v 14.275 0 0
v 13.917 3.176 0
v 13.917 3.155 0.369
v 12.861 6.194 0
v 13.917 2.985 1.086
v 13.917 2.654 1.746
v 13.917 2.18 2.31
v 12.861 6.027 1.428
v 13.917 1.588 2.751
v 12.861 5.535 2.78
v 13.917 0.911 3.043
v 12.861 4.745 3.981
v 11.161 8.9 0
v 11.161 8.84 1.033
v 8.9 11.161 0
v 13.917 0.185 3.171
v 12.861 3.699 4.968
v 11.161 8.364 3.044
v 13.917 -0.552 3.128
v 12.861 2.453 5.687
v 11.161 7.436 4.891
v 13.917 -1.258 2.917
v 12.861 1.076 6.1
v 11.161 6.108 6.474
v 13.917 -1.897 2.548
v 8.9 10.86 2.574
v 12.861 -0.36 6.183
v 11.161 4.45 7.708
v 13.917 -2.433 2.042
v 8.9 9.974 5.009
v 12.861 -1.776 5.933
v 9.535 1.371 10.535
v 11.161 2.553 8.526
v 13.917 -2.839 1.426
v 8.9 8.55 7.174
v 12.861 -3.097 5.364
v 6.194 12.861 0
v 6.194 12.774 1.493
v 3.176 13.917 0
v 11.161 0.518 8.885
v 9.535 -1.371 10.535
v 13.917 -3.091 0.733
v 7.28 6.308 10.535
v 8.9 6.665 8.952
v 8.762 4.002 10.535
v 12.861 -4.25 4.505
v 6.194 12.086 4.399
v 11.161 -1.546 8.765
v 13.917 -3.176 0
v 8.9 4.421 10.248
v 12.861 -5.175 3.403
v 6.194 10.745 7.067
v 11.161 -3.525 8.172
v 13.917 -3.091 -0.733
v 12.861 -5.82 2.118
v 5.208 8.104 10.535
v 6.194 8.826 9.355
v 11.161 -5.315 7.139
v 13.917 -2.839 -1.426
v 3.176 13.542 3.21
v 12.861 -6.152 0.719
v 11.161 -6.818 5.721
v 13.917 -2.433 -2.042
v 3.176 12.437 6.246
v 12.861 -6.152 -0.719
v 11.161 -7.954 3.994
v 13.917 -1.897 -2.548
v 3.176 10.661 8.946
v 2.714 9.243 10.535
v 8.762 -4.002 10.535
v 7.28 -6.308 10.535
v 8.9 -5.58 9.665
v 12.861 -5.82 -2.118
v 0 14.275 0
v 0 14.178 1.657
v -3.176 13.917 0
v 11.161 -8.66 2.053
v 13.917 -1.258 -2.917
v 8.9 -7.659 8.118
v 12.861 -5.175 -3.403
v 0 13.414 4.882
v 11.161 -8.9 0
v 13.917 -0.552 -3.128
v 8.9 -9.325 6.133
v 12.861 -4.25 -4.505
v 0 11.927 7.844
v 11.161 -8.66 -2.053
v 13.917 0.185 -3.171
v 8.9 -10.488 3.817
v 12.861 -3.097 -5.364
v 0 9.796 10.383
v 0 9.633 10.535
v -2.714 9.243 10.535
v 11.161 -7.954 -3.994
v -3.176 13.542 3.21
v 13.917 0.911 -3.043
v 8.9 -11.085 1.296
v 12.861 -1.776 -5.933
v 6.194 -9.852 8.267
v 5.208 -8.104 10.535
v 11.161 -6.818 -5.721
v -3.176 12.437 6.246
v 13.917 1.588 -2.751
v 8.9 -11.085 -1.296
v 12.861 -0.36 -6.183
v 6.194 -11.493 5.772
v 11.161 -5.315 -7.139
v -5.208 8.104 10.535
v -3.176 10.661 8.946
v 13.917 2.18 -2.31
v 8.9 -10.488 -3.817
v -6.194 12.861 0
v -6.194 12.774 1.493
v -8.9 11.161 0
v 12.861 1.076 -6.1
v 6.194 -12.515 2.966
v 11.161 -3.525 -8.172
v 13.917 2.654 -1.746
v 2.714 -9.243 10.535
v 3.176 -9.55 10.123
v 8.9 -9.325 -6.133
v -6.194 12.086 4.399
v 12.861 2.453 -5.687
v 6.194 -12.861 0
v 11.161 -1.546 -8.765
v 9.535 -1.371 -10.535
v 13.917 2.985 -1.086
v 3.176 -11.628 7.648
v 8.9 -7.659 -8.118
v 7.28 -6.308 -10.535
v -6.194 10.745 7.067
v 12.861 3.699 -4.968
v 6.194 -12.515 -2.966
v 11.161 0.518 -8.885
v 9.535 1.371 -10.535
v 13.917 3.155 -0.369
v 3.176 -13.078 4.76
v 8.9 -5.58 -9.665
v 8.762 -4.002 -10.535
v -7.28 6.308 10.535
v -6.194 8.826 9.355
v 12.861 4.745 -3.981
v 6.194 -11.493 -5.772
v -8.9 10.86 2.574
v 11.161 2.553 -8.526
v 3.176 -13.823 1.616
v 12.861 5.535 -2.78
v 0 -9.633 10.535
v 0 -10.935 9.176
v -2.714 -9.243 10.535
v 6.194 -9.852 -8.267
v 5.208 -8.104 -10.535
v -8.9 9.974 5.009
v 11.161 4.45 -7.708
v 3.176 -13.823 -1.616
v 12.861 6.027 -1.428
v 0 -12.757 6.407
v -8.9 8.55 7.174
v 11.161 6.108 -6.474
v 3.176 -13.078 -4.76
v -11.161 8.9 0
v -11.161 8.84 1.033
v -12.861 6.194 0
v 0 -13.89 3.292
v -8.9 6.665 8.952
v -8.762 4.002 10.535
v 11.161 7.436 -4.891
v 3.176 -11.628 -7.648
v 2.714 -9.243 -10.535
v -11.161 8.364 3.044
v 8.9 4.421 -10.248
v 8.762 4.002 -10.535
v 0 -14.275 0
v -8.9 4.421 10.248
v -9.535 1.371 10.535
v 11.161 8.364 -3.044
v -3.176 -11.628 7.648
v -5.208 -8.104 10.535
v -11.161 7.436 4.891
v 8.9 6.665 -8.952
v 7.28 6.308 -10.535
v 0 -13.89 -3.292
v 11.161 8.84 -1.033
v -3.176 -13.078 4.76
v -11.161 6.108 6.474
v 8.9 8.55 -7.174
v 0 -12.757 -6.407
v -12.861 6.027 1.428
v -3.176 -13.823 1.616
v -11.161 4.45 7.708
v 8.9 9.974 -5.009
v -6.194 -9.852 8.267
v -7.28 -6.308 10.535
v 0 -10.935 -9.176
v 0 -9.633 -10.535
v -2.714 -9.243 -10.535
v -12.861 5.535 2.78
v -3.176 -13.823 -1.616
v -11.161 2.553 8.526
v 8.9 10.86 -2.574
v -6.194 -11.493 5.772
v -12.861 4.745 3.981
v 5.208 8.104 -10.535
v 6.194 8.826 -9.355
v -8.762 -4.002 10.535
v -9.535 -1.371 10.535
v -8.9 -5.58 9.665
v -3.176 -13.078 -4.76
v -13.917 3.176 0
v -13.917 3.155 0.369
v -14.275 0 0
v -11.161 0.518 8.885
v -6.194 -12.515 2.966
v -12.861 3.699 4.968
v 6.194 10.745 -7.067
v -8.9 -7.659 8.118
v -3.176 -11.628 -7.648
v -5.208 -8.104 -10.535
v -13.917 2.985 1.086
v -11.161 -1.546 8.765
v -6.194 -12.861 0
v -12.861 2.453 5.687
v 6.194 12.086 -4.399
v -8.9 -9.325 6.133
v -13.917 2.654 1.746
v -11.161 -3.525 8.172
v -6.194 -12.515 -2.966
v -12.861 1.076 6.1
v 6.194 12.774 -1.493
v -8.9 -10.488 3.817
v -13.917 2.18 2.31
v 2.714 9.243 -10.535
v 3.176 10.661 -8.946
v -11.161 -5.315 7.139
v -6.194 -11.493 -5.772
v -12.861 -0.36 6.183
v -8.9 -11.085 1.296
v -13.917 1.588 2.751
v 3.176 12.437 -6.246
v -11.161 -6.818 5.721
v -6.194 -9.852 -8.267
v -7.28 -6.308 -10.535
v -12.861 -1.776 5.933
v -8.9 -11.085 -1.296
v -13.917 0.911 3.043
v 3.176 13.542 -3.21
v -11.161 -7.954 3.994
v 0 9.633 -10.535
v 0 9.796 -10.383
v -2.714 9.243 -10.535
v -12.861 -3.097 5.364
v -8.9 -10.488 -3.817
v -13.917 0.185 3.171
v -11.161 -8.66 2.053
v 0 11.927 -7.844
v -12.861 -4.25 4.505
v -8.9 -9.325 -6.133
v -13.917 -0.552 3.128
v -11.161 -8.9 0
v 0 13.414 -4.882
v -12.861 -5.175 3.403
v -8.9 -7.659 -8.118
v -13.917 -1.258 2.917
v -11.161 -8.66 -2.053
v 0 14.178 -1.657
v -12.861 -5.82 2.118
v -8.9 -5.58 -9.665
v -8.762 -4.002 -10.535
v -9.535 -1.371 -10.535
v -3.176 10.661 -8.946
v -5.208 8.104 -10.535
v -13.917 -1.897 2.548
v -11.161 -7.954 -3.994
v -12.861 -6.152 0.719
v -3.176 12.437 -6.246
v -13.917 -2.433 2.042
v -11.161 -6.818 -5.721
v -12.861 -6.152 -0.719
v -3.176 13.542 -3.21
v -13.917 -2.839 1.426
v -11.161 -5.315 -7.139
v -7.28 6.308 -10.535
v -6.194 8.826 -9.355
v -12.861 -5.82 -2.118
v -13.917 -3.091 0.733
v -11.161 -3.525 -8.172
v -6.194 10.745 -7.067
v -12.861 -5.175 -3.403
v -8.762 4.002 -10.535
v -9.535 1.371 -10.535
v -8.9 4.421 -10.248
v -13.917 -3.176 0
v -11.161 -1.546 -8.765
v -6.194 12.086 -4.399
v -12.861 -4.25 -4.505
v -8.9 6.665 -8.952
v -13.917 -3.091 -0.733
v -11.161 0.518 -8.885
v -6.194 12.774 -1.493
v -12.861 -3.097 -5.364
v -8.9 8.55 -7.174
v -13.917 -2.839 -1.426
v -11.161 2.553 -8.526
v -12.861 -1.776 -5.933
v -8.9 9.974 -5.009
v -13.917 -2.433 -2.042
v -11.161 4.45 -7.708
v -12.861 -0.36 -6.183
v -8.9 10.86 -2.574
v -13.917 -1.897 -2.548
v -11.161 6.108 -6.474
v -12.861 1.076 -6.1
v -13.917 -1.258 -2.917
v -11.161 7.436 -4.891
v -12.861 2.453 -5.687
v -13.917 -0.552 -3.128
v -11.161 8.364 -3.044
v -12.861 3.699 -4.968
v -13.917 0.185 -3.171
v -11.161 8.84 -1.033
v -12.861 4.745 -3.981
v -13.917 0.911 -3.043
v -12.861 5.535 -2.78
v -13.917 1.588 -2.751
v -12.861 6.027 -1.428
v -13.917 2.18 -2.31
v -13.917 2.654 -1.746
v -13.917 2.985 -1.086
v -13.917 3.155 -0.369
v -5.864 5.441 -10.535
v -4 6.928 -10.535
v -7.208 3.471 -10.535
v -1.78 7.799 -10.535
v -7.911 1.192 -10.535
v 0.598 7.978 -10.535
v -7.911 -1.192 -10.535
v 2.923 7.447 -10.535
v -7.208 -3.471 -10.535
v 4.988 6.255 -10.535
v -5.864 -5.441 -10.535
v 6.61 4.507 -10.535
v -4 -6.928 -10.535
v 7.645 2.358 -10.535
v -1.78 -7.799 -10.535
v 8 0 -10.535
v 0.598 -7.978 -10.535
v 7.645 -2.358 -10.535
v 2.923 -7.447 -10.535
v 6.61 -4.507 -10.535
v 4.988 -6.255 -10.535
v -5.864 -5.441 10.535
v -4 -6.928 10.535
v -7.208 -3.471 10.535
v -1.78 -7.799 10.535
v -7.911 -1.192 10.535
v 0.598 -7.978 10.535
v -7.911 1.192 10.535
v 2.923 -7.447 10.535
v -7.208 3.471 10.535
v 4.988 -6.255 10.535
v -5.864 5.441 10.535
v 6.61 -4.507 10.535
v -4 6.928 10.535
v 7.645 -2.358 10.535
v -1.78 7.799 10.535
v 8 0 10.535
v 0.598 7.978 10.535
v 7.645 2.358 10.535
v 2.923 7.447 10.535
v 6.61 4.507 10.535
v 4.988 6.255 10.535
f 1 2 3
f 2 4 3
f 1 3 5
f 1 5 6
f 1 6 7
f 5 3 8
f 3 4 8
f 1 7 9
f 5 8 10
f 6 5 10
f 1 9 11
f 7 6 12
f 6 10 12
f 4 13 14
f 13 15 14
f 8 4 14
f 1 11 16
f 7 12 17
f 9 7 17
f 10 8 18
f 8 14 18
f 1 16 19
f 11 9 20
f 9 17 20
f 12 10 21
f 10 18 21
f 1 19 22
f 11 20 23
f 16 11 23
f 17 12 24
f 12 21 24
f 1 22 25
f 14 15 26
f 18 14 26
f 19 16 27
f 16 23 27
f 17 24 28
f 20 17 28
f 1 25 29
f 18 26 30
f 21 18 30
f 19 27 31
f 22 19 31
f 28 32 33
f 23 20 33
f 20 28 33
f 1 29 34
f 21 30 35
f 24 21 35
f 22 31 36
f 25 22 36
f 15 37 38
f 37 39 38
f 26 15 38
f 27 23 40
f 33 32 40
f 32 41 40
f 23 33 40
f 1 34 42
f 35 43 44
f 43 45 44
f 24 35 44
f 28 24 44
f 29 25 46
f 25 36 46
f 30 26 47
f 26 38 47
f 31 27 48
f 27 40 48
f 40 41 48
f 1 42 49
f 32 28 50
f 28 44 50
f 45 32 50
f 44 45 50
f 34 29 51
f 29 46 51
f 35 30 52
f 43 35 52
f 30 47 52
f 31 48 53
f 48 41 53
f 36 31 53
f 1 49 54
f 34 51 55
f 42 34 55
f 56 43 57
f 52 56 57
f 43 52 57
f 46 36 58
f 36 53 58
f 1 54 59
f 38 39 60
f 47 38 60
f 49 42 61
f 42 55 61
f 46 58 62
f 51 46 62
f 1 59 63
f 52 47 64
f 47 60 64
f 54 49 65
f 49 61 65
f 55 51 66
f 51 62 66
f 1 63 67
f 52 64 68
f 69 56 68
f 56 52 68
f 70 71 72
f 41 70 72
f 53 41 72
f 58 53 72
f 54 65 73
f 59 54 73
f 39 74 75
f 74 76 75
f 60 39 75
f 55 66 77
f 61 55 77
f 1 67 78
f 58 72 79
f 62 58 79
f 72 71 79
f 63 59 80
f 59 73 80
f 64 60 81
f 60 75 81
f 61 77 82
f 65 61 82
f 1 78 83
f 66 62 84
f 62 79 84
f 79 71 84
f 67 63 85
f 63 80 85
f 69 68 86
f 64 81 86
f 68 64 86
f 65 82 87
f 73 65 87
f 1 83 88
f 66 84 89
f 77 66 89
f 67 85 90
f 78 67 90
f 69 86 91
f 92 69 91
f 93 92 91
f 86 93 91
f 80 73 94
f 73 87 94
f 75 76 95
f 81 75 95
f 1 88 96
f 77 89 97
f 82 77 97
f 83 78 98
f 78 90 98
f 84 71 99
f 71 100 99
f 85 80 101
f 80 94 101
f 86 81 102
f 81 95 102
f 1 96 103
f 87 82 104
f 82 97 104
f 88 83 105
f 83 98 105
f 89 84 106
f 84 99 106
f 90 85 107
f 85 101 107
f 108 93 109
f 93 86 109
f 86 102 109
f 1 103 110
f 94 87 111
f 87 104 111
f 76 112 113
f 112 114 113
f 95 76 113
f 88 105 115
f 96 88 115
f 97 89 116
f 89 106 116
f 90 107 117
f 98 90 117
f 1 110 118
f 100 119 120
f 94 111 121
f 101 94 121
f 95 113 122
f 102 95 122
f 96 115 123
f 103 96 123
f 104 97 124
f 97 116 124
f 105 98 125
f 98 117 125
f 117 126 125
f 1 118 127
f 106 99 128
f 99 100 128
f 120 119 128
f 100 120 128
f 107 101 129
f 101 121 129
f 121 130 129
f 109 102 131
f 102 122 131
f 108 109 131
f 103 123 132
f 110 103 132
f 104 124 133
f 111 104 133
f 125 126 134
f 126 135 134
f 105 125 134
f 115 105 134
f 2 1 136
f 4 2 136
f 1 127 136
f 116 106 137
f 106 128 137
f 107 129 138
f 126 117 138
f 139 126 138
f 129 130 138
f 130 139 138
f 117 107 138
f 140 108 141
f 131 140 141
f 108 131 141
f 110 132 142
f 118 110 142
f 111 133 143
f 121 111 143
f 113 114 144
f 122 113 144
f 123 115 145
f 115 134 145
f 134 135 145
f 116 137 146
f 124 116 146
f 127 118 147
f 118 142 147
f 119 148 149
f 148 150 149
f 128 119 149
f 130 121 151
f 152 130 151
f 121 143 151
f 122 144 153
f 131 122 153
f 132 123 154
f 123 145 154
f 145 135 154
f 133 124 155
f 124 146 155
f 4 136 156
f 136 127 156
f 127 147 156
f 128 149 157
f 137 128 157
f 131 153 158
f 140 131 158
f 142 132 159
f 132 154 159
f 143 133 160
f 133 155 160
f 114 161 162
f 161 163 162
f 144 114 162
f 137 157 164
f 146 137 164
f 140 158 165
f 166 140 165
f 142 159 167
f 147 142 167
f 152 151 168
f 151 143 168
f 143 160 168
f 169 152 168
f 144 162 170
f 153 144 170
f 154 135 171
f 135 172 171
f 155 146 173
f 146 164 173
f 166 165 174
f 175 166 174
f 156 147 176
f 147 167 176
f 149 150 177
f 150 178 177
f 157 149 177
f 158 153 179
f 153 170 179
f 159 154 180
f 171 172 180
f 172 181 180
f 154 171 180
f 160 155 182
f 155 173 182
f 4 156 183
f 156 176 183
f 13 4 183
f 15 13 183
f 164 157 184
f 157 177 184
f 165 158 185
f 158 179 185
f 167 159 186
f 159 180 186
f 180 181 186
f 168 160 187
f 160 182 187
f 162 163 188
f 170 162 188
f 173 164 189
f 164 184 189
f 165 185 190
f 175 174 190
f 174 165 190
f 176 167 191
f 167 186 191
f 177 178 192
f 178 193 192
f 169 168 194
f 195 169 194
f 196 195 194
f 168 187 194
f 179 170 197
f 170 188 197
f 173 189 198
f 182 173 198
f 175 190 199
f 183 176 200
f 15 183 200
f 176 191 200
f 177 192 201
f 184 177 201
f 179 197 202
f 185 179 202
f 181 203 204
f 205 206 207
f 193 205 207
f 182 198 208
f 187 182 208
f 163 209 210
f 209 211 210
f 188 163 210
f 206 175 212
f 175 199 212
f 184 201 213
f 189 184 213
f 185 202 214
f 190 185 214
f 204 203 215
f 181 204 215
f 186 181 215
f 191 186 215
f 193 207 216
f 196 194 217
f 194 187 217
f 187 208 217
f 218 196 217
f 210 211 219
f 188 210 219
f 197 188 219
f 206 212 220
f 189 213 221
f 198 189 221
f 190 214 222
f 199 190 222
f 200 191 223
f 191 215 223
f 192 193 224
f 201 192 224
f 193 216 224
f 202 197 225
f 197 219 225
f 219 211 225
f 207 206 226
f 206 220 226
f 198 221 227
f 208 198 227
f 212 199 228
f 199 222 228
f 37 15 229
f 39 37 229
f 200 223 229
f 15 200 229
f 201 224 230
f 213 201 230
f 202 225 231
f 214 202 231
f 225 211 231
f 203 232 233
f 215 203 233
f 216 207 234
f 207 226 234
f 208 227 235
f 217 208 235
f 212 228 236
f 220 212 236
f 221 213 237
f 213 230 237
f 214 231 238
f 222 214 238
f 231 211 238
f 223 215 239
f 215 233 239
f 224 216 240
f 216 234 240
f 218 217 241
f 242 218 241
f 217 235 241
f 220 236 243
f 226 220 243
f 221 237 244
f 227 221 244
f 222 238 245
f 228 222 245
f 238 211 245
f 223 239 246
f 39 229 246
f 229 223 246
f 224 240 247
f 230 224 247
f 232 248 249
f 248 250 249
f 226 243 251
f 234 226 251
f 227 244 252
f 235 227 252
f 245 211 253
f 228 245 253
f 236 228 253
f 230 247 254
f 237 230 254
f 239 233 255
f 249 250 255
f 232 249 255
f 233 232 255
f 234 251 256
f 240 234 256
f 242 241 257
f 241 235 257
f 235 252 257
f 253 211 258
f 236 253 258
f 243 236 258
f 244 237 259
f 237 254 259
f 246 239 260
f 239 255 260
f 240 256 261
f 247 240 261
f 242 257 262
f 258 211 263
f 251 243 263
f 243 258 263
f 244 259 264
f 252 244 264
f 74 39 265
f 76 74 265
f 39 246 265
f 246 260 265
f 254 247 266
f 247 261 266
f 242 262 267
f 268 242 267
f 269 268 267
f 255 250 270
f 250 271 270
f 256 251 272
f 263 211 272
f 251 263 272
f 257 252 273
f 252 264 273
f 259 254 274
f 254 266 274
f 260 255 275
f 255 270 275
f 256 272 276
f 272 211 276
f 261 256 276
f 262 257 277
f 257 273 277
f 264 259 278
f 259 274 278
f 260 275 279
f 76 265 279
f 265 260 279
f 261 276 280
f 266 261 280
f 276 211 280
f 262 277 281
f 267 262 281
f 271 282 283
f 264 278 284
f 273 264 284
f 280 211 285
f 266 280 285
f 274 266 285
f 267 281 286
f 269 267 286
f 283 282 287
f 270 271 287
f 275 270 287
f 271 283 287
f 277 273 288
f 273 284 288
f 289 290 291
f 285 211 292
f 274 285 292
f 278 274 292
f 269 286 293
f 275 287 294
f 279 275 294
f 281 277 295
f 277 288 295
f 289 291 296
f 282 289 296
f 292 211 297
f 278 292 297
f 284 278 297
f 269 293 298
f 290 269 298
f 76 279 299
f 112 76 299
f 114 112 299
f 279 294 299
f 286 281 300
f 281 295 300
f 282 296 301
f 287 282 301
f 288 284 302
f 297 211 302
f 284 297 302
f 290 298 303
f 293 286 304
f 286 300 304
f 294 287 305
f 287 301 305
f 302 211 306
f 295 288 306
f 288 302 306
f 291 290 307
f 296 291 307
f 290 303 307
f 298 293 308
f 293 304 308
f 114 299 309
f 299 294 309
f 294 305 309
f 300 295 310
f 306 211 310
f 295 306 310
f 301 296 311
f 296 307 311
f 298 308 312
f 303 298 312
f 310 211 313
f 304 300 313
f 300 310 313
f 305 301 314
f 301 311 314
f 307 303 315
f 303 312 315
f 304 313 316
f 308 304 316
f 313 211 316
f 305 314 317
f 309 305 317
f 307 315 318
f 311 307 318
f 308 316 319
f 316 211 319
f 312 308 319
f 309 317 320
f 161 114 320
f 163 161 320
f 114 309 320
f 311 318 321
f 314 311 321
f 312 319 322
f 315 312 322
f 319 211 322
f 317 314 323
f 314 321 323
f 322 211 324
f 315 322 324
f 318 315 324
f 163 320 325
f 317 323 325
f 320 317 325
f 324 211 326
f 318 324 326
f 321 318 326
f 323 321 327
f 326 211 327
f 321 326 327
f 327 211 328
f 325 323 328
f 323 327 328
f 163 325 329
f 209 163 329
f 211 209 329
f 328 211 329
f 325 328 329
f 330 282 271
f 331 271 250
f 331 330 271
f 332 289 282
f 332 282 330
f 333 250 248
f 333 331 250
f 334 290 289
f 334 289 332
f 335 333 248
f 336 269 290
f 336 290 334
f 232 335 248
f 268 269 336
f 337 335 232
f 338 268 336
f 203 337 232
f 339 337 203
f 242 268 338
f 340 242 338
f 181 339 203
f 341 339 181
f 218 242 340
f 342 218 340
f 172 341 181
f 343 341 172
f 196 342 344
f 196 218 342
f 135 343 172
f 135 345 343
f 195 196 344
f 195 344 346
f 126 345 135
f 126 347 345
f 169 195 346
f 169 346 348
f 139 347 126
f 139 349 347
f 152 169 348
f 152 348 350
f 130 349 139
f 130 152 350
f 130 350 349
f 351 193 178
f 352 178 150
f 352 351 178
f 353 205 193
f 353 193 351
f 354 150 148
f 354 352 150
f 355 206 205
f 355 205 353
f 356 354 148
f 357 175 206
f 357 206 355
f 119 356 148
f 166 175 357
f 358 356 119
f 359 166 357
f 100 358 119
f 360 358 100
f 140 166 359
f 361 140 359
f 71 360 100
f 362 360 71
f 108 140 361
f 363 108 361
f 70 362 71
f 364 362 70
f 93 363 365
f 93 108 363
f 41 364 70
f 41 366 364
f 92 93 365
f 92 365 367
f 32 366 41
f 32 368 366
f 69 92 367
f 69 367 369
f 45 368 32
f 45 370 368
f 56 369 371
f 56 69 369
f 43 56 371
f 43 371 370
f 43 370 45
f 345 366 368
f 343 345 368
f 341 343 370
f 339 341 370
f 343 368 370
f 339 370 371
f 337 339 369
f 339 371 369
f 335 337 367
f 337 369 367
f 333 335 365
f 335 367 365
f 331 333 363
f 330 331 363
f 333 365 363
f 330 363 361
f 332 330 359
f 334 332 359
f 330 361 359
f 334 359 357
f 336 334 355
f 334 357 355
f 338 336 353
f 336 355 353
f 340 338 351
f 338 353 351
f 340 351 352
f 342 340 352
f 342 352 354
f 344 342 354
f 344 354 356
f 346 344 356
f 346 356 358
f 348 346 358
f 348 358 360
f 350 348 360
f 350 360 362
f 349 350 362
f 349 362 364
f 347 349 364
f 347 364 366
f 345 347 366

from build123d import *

# Parameters (mm, degrees)
F2_W     = 40
F2_H     = 10
F3_DEPTH = 12.5
F4_R     = 8
F5_DEPTH = 24.811


with BuildPart() as f1:
    # F0 (on Top) → F1 (revolve)
    with BuildSketch(Plane.XY):
        with BuildLine():
            Line((-14.275, 0), (14.275, 0))
            ThreePointArc((14.275, 0), (0, 14.275), (-14.275, 0))
        make_face()
    revolve(axis=Axis((0, 0, 0), (1, 0, 0)))

    # F2 (on Front) → F3 (cut, symmetric)
    with BuildSketch(Plane.XZ):
        with Locations((0, 15.535)):
            Rectangle(F2_W, F2_H)
        with Locations((0, -15.535)):
            Rectangle(F2_W, F2_H)
    extrude(amount=F3_DEPTH, both=True, mode=Mode.SUBTRACT)

    # F4 (on face) → F5 (cut, through all)
    with BuildSketch(Plane.XY.offset(10.535)):
        Circle(F4_R)
    extrude(amount=-F5_DEPTH, mode=Mode.SUBTRACT)


solid = f1.part
